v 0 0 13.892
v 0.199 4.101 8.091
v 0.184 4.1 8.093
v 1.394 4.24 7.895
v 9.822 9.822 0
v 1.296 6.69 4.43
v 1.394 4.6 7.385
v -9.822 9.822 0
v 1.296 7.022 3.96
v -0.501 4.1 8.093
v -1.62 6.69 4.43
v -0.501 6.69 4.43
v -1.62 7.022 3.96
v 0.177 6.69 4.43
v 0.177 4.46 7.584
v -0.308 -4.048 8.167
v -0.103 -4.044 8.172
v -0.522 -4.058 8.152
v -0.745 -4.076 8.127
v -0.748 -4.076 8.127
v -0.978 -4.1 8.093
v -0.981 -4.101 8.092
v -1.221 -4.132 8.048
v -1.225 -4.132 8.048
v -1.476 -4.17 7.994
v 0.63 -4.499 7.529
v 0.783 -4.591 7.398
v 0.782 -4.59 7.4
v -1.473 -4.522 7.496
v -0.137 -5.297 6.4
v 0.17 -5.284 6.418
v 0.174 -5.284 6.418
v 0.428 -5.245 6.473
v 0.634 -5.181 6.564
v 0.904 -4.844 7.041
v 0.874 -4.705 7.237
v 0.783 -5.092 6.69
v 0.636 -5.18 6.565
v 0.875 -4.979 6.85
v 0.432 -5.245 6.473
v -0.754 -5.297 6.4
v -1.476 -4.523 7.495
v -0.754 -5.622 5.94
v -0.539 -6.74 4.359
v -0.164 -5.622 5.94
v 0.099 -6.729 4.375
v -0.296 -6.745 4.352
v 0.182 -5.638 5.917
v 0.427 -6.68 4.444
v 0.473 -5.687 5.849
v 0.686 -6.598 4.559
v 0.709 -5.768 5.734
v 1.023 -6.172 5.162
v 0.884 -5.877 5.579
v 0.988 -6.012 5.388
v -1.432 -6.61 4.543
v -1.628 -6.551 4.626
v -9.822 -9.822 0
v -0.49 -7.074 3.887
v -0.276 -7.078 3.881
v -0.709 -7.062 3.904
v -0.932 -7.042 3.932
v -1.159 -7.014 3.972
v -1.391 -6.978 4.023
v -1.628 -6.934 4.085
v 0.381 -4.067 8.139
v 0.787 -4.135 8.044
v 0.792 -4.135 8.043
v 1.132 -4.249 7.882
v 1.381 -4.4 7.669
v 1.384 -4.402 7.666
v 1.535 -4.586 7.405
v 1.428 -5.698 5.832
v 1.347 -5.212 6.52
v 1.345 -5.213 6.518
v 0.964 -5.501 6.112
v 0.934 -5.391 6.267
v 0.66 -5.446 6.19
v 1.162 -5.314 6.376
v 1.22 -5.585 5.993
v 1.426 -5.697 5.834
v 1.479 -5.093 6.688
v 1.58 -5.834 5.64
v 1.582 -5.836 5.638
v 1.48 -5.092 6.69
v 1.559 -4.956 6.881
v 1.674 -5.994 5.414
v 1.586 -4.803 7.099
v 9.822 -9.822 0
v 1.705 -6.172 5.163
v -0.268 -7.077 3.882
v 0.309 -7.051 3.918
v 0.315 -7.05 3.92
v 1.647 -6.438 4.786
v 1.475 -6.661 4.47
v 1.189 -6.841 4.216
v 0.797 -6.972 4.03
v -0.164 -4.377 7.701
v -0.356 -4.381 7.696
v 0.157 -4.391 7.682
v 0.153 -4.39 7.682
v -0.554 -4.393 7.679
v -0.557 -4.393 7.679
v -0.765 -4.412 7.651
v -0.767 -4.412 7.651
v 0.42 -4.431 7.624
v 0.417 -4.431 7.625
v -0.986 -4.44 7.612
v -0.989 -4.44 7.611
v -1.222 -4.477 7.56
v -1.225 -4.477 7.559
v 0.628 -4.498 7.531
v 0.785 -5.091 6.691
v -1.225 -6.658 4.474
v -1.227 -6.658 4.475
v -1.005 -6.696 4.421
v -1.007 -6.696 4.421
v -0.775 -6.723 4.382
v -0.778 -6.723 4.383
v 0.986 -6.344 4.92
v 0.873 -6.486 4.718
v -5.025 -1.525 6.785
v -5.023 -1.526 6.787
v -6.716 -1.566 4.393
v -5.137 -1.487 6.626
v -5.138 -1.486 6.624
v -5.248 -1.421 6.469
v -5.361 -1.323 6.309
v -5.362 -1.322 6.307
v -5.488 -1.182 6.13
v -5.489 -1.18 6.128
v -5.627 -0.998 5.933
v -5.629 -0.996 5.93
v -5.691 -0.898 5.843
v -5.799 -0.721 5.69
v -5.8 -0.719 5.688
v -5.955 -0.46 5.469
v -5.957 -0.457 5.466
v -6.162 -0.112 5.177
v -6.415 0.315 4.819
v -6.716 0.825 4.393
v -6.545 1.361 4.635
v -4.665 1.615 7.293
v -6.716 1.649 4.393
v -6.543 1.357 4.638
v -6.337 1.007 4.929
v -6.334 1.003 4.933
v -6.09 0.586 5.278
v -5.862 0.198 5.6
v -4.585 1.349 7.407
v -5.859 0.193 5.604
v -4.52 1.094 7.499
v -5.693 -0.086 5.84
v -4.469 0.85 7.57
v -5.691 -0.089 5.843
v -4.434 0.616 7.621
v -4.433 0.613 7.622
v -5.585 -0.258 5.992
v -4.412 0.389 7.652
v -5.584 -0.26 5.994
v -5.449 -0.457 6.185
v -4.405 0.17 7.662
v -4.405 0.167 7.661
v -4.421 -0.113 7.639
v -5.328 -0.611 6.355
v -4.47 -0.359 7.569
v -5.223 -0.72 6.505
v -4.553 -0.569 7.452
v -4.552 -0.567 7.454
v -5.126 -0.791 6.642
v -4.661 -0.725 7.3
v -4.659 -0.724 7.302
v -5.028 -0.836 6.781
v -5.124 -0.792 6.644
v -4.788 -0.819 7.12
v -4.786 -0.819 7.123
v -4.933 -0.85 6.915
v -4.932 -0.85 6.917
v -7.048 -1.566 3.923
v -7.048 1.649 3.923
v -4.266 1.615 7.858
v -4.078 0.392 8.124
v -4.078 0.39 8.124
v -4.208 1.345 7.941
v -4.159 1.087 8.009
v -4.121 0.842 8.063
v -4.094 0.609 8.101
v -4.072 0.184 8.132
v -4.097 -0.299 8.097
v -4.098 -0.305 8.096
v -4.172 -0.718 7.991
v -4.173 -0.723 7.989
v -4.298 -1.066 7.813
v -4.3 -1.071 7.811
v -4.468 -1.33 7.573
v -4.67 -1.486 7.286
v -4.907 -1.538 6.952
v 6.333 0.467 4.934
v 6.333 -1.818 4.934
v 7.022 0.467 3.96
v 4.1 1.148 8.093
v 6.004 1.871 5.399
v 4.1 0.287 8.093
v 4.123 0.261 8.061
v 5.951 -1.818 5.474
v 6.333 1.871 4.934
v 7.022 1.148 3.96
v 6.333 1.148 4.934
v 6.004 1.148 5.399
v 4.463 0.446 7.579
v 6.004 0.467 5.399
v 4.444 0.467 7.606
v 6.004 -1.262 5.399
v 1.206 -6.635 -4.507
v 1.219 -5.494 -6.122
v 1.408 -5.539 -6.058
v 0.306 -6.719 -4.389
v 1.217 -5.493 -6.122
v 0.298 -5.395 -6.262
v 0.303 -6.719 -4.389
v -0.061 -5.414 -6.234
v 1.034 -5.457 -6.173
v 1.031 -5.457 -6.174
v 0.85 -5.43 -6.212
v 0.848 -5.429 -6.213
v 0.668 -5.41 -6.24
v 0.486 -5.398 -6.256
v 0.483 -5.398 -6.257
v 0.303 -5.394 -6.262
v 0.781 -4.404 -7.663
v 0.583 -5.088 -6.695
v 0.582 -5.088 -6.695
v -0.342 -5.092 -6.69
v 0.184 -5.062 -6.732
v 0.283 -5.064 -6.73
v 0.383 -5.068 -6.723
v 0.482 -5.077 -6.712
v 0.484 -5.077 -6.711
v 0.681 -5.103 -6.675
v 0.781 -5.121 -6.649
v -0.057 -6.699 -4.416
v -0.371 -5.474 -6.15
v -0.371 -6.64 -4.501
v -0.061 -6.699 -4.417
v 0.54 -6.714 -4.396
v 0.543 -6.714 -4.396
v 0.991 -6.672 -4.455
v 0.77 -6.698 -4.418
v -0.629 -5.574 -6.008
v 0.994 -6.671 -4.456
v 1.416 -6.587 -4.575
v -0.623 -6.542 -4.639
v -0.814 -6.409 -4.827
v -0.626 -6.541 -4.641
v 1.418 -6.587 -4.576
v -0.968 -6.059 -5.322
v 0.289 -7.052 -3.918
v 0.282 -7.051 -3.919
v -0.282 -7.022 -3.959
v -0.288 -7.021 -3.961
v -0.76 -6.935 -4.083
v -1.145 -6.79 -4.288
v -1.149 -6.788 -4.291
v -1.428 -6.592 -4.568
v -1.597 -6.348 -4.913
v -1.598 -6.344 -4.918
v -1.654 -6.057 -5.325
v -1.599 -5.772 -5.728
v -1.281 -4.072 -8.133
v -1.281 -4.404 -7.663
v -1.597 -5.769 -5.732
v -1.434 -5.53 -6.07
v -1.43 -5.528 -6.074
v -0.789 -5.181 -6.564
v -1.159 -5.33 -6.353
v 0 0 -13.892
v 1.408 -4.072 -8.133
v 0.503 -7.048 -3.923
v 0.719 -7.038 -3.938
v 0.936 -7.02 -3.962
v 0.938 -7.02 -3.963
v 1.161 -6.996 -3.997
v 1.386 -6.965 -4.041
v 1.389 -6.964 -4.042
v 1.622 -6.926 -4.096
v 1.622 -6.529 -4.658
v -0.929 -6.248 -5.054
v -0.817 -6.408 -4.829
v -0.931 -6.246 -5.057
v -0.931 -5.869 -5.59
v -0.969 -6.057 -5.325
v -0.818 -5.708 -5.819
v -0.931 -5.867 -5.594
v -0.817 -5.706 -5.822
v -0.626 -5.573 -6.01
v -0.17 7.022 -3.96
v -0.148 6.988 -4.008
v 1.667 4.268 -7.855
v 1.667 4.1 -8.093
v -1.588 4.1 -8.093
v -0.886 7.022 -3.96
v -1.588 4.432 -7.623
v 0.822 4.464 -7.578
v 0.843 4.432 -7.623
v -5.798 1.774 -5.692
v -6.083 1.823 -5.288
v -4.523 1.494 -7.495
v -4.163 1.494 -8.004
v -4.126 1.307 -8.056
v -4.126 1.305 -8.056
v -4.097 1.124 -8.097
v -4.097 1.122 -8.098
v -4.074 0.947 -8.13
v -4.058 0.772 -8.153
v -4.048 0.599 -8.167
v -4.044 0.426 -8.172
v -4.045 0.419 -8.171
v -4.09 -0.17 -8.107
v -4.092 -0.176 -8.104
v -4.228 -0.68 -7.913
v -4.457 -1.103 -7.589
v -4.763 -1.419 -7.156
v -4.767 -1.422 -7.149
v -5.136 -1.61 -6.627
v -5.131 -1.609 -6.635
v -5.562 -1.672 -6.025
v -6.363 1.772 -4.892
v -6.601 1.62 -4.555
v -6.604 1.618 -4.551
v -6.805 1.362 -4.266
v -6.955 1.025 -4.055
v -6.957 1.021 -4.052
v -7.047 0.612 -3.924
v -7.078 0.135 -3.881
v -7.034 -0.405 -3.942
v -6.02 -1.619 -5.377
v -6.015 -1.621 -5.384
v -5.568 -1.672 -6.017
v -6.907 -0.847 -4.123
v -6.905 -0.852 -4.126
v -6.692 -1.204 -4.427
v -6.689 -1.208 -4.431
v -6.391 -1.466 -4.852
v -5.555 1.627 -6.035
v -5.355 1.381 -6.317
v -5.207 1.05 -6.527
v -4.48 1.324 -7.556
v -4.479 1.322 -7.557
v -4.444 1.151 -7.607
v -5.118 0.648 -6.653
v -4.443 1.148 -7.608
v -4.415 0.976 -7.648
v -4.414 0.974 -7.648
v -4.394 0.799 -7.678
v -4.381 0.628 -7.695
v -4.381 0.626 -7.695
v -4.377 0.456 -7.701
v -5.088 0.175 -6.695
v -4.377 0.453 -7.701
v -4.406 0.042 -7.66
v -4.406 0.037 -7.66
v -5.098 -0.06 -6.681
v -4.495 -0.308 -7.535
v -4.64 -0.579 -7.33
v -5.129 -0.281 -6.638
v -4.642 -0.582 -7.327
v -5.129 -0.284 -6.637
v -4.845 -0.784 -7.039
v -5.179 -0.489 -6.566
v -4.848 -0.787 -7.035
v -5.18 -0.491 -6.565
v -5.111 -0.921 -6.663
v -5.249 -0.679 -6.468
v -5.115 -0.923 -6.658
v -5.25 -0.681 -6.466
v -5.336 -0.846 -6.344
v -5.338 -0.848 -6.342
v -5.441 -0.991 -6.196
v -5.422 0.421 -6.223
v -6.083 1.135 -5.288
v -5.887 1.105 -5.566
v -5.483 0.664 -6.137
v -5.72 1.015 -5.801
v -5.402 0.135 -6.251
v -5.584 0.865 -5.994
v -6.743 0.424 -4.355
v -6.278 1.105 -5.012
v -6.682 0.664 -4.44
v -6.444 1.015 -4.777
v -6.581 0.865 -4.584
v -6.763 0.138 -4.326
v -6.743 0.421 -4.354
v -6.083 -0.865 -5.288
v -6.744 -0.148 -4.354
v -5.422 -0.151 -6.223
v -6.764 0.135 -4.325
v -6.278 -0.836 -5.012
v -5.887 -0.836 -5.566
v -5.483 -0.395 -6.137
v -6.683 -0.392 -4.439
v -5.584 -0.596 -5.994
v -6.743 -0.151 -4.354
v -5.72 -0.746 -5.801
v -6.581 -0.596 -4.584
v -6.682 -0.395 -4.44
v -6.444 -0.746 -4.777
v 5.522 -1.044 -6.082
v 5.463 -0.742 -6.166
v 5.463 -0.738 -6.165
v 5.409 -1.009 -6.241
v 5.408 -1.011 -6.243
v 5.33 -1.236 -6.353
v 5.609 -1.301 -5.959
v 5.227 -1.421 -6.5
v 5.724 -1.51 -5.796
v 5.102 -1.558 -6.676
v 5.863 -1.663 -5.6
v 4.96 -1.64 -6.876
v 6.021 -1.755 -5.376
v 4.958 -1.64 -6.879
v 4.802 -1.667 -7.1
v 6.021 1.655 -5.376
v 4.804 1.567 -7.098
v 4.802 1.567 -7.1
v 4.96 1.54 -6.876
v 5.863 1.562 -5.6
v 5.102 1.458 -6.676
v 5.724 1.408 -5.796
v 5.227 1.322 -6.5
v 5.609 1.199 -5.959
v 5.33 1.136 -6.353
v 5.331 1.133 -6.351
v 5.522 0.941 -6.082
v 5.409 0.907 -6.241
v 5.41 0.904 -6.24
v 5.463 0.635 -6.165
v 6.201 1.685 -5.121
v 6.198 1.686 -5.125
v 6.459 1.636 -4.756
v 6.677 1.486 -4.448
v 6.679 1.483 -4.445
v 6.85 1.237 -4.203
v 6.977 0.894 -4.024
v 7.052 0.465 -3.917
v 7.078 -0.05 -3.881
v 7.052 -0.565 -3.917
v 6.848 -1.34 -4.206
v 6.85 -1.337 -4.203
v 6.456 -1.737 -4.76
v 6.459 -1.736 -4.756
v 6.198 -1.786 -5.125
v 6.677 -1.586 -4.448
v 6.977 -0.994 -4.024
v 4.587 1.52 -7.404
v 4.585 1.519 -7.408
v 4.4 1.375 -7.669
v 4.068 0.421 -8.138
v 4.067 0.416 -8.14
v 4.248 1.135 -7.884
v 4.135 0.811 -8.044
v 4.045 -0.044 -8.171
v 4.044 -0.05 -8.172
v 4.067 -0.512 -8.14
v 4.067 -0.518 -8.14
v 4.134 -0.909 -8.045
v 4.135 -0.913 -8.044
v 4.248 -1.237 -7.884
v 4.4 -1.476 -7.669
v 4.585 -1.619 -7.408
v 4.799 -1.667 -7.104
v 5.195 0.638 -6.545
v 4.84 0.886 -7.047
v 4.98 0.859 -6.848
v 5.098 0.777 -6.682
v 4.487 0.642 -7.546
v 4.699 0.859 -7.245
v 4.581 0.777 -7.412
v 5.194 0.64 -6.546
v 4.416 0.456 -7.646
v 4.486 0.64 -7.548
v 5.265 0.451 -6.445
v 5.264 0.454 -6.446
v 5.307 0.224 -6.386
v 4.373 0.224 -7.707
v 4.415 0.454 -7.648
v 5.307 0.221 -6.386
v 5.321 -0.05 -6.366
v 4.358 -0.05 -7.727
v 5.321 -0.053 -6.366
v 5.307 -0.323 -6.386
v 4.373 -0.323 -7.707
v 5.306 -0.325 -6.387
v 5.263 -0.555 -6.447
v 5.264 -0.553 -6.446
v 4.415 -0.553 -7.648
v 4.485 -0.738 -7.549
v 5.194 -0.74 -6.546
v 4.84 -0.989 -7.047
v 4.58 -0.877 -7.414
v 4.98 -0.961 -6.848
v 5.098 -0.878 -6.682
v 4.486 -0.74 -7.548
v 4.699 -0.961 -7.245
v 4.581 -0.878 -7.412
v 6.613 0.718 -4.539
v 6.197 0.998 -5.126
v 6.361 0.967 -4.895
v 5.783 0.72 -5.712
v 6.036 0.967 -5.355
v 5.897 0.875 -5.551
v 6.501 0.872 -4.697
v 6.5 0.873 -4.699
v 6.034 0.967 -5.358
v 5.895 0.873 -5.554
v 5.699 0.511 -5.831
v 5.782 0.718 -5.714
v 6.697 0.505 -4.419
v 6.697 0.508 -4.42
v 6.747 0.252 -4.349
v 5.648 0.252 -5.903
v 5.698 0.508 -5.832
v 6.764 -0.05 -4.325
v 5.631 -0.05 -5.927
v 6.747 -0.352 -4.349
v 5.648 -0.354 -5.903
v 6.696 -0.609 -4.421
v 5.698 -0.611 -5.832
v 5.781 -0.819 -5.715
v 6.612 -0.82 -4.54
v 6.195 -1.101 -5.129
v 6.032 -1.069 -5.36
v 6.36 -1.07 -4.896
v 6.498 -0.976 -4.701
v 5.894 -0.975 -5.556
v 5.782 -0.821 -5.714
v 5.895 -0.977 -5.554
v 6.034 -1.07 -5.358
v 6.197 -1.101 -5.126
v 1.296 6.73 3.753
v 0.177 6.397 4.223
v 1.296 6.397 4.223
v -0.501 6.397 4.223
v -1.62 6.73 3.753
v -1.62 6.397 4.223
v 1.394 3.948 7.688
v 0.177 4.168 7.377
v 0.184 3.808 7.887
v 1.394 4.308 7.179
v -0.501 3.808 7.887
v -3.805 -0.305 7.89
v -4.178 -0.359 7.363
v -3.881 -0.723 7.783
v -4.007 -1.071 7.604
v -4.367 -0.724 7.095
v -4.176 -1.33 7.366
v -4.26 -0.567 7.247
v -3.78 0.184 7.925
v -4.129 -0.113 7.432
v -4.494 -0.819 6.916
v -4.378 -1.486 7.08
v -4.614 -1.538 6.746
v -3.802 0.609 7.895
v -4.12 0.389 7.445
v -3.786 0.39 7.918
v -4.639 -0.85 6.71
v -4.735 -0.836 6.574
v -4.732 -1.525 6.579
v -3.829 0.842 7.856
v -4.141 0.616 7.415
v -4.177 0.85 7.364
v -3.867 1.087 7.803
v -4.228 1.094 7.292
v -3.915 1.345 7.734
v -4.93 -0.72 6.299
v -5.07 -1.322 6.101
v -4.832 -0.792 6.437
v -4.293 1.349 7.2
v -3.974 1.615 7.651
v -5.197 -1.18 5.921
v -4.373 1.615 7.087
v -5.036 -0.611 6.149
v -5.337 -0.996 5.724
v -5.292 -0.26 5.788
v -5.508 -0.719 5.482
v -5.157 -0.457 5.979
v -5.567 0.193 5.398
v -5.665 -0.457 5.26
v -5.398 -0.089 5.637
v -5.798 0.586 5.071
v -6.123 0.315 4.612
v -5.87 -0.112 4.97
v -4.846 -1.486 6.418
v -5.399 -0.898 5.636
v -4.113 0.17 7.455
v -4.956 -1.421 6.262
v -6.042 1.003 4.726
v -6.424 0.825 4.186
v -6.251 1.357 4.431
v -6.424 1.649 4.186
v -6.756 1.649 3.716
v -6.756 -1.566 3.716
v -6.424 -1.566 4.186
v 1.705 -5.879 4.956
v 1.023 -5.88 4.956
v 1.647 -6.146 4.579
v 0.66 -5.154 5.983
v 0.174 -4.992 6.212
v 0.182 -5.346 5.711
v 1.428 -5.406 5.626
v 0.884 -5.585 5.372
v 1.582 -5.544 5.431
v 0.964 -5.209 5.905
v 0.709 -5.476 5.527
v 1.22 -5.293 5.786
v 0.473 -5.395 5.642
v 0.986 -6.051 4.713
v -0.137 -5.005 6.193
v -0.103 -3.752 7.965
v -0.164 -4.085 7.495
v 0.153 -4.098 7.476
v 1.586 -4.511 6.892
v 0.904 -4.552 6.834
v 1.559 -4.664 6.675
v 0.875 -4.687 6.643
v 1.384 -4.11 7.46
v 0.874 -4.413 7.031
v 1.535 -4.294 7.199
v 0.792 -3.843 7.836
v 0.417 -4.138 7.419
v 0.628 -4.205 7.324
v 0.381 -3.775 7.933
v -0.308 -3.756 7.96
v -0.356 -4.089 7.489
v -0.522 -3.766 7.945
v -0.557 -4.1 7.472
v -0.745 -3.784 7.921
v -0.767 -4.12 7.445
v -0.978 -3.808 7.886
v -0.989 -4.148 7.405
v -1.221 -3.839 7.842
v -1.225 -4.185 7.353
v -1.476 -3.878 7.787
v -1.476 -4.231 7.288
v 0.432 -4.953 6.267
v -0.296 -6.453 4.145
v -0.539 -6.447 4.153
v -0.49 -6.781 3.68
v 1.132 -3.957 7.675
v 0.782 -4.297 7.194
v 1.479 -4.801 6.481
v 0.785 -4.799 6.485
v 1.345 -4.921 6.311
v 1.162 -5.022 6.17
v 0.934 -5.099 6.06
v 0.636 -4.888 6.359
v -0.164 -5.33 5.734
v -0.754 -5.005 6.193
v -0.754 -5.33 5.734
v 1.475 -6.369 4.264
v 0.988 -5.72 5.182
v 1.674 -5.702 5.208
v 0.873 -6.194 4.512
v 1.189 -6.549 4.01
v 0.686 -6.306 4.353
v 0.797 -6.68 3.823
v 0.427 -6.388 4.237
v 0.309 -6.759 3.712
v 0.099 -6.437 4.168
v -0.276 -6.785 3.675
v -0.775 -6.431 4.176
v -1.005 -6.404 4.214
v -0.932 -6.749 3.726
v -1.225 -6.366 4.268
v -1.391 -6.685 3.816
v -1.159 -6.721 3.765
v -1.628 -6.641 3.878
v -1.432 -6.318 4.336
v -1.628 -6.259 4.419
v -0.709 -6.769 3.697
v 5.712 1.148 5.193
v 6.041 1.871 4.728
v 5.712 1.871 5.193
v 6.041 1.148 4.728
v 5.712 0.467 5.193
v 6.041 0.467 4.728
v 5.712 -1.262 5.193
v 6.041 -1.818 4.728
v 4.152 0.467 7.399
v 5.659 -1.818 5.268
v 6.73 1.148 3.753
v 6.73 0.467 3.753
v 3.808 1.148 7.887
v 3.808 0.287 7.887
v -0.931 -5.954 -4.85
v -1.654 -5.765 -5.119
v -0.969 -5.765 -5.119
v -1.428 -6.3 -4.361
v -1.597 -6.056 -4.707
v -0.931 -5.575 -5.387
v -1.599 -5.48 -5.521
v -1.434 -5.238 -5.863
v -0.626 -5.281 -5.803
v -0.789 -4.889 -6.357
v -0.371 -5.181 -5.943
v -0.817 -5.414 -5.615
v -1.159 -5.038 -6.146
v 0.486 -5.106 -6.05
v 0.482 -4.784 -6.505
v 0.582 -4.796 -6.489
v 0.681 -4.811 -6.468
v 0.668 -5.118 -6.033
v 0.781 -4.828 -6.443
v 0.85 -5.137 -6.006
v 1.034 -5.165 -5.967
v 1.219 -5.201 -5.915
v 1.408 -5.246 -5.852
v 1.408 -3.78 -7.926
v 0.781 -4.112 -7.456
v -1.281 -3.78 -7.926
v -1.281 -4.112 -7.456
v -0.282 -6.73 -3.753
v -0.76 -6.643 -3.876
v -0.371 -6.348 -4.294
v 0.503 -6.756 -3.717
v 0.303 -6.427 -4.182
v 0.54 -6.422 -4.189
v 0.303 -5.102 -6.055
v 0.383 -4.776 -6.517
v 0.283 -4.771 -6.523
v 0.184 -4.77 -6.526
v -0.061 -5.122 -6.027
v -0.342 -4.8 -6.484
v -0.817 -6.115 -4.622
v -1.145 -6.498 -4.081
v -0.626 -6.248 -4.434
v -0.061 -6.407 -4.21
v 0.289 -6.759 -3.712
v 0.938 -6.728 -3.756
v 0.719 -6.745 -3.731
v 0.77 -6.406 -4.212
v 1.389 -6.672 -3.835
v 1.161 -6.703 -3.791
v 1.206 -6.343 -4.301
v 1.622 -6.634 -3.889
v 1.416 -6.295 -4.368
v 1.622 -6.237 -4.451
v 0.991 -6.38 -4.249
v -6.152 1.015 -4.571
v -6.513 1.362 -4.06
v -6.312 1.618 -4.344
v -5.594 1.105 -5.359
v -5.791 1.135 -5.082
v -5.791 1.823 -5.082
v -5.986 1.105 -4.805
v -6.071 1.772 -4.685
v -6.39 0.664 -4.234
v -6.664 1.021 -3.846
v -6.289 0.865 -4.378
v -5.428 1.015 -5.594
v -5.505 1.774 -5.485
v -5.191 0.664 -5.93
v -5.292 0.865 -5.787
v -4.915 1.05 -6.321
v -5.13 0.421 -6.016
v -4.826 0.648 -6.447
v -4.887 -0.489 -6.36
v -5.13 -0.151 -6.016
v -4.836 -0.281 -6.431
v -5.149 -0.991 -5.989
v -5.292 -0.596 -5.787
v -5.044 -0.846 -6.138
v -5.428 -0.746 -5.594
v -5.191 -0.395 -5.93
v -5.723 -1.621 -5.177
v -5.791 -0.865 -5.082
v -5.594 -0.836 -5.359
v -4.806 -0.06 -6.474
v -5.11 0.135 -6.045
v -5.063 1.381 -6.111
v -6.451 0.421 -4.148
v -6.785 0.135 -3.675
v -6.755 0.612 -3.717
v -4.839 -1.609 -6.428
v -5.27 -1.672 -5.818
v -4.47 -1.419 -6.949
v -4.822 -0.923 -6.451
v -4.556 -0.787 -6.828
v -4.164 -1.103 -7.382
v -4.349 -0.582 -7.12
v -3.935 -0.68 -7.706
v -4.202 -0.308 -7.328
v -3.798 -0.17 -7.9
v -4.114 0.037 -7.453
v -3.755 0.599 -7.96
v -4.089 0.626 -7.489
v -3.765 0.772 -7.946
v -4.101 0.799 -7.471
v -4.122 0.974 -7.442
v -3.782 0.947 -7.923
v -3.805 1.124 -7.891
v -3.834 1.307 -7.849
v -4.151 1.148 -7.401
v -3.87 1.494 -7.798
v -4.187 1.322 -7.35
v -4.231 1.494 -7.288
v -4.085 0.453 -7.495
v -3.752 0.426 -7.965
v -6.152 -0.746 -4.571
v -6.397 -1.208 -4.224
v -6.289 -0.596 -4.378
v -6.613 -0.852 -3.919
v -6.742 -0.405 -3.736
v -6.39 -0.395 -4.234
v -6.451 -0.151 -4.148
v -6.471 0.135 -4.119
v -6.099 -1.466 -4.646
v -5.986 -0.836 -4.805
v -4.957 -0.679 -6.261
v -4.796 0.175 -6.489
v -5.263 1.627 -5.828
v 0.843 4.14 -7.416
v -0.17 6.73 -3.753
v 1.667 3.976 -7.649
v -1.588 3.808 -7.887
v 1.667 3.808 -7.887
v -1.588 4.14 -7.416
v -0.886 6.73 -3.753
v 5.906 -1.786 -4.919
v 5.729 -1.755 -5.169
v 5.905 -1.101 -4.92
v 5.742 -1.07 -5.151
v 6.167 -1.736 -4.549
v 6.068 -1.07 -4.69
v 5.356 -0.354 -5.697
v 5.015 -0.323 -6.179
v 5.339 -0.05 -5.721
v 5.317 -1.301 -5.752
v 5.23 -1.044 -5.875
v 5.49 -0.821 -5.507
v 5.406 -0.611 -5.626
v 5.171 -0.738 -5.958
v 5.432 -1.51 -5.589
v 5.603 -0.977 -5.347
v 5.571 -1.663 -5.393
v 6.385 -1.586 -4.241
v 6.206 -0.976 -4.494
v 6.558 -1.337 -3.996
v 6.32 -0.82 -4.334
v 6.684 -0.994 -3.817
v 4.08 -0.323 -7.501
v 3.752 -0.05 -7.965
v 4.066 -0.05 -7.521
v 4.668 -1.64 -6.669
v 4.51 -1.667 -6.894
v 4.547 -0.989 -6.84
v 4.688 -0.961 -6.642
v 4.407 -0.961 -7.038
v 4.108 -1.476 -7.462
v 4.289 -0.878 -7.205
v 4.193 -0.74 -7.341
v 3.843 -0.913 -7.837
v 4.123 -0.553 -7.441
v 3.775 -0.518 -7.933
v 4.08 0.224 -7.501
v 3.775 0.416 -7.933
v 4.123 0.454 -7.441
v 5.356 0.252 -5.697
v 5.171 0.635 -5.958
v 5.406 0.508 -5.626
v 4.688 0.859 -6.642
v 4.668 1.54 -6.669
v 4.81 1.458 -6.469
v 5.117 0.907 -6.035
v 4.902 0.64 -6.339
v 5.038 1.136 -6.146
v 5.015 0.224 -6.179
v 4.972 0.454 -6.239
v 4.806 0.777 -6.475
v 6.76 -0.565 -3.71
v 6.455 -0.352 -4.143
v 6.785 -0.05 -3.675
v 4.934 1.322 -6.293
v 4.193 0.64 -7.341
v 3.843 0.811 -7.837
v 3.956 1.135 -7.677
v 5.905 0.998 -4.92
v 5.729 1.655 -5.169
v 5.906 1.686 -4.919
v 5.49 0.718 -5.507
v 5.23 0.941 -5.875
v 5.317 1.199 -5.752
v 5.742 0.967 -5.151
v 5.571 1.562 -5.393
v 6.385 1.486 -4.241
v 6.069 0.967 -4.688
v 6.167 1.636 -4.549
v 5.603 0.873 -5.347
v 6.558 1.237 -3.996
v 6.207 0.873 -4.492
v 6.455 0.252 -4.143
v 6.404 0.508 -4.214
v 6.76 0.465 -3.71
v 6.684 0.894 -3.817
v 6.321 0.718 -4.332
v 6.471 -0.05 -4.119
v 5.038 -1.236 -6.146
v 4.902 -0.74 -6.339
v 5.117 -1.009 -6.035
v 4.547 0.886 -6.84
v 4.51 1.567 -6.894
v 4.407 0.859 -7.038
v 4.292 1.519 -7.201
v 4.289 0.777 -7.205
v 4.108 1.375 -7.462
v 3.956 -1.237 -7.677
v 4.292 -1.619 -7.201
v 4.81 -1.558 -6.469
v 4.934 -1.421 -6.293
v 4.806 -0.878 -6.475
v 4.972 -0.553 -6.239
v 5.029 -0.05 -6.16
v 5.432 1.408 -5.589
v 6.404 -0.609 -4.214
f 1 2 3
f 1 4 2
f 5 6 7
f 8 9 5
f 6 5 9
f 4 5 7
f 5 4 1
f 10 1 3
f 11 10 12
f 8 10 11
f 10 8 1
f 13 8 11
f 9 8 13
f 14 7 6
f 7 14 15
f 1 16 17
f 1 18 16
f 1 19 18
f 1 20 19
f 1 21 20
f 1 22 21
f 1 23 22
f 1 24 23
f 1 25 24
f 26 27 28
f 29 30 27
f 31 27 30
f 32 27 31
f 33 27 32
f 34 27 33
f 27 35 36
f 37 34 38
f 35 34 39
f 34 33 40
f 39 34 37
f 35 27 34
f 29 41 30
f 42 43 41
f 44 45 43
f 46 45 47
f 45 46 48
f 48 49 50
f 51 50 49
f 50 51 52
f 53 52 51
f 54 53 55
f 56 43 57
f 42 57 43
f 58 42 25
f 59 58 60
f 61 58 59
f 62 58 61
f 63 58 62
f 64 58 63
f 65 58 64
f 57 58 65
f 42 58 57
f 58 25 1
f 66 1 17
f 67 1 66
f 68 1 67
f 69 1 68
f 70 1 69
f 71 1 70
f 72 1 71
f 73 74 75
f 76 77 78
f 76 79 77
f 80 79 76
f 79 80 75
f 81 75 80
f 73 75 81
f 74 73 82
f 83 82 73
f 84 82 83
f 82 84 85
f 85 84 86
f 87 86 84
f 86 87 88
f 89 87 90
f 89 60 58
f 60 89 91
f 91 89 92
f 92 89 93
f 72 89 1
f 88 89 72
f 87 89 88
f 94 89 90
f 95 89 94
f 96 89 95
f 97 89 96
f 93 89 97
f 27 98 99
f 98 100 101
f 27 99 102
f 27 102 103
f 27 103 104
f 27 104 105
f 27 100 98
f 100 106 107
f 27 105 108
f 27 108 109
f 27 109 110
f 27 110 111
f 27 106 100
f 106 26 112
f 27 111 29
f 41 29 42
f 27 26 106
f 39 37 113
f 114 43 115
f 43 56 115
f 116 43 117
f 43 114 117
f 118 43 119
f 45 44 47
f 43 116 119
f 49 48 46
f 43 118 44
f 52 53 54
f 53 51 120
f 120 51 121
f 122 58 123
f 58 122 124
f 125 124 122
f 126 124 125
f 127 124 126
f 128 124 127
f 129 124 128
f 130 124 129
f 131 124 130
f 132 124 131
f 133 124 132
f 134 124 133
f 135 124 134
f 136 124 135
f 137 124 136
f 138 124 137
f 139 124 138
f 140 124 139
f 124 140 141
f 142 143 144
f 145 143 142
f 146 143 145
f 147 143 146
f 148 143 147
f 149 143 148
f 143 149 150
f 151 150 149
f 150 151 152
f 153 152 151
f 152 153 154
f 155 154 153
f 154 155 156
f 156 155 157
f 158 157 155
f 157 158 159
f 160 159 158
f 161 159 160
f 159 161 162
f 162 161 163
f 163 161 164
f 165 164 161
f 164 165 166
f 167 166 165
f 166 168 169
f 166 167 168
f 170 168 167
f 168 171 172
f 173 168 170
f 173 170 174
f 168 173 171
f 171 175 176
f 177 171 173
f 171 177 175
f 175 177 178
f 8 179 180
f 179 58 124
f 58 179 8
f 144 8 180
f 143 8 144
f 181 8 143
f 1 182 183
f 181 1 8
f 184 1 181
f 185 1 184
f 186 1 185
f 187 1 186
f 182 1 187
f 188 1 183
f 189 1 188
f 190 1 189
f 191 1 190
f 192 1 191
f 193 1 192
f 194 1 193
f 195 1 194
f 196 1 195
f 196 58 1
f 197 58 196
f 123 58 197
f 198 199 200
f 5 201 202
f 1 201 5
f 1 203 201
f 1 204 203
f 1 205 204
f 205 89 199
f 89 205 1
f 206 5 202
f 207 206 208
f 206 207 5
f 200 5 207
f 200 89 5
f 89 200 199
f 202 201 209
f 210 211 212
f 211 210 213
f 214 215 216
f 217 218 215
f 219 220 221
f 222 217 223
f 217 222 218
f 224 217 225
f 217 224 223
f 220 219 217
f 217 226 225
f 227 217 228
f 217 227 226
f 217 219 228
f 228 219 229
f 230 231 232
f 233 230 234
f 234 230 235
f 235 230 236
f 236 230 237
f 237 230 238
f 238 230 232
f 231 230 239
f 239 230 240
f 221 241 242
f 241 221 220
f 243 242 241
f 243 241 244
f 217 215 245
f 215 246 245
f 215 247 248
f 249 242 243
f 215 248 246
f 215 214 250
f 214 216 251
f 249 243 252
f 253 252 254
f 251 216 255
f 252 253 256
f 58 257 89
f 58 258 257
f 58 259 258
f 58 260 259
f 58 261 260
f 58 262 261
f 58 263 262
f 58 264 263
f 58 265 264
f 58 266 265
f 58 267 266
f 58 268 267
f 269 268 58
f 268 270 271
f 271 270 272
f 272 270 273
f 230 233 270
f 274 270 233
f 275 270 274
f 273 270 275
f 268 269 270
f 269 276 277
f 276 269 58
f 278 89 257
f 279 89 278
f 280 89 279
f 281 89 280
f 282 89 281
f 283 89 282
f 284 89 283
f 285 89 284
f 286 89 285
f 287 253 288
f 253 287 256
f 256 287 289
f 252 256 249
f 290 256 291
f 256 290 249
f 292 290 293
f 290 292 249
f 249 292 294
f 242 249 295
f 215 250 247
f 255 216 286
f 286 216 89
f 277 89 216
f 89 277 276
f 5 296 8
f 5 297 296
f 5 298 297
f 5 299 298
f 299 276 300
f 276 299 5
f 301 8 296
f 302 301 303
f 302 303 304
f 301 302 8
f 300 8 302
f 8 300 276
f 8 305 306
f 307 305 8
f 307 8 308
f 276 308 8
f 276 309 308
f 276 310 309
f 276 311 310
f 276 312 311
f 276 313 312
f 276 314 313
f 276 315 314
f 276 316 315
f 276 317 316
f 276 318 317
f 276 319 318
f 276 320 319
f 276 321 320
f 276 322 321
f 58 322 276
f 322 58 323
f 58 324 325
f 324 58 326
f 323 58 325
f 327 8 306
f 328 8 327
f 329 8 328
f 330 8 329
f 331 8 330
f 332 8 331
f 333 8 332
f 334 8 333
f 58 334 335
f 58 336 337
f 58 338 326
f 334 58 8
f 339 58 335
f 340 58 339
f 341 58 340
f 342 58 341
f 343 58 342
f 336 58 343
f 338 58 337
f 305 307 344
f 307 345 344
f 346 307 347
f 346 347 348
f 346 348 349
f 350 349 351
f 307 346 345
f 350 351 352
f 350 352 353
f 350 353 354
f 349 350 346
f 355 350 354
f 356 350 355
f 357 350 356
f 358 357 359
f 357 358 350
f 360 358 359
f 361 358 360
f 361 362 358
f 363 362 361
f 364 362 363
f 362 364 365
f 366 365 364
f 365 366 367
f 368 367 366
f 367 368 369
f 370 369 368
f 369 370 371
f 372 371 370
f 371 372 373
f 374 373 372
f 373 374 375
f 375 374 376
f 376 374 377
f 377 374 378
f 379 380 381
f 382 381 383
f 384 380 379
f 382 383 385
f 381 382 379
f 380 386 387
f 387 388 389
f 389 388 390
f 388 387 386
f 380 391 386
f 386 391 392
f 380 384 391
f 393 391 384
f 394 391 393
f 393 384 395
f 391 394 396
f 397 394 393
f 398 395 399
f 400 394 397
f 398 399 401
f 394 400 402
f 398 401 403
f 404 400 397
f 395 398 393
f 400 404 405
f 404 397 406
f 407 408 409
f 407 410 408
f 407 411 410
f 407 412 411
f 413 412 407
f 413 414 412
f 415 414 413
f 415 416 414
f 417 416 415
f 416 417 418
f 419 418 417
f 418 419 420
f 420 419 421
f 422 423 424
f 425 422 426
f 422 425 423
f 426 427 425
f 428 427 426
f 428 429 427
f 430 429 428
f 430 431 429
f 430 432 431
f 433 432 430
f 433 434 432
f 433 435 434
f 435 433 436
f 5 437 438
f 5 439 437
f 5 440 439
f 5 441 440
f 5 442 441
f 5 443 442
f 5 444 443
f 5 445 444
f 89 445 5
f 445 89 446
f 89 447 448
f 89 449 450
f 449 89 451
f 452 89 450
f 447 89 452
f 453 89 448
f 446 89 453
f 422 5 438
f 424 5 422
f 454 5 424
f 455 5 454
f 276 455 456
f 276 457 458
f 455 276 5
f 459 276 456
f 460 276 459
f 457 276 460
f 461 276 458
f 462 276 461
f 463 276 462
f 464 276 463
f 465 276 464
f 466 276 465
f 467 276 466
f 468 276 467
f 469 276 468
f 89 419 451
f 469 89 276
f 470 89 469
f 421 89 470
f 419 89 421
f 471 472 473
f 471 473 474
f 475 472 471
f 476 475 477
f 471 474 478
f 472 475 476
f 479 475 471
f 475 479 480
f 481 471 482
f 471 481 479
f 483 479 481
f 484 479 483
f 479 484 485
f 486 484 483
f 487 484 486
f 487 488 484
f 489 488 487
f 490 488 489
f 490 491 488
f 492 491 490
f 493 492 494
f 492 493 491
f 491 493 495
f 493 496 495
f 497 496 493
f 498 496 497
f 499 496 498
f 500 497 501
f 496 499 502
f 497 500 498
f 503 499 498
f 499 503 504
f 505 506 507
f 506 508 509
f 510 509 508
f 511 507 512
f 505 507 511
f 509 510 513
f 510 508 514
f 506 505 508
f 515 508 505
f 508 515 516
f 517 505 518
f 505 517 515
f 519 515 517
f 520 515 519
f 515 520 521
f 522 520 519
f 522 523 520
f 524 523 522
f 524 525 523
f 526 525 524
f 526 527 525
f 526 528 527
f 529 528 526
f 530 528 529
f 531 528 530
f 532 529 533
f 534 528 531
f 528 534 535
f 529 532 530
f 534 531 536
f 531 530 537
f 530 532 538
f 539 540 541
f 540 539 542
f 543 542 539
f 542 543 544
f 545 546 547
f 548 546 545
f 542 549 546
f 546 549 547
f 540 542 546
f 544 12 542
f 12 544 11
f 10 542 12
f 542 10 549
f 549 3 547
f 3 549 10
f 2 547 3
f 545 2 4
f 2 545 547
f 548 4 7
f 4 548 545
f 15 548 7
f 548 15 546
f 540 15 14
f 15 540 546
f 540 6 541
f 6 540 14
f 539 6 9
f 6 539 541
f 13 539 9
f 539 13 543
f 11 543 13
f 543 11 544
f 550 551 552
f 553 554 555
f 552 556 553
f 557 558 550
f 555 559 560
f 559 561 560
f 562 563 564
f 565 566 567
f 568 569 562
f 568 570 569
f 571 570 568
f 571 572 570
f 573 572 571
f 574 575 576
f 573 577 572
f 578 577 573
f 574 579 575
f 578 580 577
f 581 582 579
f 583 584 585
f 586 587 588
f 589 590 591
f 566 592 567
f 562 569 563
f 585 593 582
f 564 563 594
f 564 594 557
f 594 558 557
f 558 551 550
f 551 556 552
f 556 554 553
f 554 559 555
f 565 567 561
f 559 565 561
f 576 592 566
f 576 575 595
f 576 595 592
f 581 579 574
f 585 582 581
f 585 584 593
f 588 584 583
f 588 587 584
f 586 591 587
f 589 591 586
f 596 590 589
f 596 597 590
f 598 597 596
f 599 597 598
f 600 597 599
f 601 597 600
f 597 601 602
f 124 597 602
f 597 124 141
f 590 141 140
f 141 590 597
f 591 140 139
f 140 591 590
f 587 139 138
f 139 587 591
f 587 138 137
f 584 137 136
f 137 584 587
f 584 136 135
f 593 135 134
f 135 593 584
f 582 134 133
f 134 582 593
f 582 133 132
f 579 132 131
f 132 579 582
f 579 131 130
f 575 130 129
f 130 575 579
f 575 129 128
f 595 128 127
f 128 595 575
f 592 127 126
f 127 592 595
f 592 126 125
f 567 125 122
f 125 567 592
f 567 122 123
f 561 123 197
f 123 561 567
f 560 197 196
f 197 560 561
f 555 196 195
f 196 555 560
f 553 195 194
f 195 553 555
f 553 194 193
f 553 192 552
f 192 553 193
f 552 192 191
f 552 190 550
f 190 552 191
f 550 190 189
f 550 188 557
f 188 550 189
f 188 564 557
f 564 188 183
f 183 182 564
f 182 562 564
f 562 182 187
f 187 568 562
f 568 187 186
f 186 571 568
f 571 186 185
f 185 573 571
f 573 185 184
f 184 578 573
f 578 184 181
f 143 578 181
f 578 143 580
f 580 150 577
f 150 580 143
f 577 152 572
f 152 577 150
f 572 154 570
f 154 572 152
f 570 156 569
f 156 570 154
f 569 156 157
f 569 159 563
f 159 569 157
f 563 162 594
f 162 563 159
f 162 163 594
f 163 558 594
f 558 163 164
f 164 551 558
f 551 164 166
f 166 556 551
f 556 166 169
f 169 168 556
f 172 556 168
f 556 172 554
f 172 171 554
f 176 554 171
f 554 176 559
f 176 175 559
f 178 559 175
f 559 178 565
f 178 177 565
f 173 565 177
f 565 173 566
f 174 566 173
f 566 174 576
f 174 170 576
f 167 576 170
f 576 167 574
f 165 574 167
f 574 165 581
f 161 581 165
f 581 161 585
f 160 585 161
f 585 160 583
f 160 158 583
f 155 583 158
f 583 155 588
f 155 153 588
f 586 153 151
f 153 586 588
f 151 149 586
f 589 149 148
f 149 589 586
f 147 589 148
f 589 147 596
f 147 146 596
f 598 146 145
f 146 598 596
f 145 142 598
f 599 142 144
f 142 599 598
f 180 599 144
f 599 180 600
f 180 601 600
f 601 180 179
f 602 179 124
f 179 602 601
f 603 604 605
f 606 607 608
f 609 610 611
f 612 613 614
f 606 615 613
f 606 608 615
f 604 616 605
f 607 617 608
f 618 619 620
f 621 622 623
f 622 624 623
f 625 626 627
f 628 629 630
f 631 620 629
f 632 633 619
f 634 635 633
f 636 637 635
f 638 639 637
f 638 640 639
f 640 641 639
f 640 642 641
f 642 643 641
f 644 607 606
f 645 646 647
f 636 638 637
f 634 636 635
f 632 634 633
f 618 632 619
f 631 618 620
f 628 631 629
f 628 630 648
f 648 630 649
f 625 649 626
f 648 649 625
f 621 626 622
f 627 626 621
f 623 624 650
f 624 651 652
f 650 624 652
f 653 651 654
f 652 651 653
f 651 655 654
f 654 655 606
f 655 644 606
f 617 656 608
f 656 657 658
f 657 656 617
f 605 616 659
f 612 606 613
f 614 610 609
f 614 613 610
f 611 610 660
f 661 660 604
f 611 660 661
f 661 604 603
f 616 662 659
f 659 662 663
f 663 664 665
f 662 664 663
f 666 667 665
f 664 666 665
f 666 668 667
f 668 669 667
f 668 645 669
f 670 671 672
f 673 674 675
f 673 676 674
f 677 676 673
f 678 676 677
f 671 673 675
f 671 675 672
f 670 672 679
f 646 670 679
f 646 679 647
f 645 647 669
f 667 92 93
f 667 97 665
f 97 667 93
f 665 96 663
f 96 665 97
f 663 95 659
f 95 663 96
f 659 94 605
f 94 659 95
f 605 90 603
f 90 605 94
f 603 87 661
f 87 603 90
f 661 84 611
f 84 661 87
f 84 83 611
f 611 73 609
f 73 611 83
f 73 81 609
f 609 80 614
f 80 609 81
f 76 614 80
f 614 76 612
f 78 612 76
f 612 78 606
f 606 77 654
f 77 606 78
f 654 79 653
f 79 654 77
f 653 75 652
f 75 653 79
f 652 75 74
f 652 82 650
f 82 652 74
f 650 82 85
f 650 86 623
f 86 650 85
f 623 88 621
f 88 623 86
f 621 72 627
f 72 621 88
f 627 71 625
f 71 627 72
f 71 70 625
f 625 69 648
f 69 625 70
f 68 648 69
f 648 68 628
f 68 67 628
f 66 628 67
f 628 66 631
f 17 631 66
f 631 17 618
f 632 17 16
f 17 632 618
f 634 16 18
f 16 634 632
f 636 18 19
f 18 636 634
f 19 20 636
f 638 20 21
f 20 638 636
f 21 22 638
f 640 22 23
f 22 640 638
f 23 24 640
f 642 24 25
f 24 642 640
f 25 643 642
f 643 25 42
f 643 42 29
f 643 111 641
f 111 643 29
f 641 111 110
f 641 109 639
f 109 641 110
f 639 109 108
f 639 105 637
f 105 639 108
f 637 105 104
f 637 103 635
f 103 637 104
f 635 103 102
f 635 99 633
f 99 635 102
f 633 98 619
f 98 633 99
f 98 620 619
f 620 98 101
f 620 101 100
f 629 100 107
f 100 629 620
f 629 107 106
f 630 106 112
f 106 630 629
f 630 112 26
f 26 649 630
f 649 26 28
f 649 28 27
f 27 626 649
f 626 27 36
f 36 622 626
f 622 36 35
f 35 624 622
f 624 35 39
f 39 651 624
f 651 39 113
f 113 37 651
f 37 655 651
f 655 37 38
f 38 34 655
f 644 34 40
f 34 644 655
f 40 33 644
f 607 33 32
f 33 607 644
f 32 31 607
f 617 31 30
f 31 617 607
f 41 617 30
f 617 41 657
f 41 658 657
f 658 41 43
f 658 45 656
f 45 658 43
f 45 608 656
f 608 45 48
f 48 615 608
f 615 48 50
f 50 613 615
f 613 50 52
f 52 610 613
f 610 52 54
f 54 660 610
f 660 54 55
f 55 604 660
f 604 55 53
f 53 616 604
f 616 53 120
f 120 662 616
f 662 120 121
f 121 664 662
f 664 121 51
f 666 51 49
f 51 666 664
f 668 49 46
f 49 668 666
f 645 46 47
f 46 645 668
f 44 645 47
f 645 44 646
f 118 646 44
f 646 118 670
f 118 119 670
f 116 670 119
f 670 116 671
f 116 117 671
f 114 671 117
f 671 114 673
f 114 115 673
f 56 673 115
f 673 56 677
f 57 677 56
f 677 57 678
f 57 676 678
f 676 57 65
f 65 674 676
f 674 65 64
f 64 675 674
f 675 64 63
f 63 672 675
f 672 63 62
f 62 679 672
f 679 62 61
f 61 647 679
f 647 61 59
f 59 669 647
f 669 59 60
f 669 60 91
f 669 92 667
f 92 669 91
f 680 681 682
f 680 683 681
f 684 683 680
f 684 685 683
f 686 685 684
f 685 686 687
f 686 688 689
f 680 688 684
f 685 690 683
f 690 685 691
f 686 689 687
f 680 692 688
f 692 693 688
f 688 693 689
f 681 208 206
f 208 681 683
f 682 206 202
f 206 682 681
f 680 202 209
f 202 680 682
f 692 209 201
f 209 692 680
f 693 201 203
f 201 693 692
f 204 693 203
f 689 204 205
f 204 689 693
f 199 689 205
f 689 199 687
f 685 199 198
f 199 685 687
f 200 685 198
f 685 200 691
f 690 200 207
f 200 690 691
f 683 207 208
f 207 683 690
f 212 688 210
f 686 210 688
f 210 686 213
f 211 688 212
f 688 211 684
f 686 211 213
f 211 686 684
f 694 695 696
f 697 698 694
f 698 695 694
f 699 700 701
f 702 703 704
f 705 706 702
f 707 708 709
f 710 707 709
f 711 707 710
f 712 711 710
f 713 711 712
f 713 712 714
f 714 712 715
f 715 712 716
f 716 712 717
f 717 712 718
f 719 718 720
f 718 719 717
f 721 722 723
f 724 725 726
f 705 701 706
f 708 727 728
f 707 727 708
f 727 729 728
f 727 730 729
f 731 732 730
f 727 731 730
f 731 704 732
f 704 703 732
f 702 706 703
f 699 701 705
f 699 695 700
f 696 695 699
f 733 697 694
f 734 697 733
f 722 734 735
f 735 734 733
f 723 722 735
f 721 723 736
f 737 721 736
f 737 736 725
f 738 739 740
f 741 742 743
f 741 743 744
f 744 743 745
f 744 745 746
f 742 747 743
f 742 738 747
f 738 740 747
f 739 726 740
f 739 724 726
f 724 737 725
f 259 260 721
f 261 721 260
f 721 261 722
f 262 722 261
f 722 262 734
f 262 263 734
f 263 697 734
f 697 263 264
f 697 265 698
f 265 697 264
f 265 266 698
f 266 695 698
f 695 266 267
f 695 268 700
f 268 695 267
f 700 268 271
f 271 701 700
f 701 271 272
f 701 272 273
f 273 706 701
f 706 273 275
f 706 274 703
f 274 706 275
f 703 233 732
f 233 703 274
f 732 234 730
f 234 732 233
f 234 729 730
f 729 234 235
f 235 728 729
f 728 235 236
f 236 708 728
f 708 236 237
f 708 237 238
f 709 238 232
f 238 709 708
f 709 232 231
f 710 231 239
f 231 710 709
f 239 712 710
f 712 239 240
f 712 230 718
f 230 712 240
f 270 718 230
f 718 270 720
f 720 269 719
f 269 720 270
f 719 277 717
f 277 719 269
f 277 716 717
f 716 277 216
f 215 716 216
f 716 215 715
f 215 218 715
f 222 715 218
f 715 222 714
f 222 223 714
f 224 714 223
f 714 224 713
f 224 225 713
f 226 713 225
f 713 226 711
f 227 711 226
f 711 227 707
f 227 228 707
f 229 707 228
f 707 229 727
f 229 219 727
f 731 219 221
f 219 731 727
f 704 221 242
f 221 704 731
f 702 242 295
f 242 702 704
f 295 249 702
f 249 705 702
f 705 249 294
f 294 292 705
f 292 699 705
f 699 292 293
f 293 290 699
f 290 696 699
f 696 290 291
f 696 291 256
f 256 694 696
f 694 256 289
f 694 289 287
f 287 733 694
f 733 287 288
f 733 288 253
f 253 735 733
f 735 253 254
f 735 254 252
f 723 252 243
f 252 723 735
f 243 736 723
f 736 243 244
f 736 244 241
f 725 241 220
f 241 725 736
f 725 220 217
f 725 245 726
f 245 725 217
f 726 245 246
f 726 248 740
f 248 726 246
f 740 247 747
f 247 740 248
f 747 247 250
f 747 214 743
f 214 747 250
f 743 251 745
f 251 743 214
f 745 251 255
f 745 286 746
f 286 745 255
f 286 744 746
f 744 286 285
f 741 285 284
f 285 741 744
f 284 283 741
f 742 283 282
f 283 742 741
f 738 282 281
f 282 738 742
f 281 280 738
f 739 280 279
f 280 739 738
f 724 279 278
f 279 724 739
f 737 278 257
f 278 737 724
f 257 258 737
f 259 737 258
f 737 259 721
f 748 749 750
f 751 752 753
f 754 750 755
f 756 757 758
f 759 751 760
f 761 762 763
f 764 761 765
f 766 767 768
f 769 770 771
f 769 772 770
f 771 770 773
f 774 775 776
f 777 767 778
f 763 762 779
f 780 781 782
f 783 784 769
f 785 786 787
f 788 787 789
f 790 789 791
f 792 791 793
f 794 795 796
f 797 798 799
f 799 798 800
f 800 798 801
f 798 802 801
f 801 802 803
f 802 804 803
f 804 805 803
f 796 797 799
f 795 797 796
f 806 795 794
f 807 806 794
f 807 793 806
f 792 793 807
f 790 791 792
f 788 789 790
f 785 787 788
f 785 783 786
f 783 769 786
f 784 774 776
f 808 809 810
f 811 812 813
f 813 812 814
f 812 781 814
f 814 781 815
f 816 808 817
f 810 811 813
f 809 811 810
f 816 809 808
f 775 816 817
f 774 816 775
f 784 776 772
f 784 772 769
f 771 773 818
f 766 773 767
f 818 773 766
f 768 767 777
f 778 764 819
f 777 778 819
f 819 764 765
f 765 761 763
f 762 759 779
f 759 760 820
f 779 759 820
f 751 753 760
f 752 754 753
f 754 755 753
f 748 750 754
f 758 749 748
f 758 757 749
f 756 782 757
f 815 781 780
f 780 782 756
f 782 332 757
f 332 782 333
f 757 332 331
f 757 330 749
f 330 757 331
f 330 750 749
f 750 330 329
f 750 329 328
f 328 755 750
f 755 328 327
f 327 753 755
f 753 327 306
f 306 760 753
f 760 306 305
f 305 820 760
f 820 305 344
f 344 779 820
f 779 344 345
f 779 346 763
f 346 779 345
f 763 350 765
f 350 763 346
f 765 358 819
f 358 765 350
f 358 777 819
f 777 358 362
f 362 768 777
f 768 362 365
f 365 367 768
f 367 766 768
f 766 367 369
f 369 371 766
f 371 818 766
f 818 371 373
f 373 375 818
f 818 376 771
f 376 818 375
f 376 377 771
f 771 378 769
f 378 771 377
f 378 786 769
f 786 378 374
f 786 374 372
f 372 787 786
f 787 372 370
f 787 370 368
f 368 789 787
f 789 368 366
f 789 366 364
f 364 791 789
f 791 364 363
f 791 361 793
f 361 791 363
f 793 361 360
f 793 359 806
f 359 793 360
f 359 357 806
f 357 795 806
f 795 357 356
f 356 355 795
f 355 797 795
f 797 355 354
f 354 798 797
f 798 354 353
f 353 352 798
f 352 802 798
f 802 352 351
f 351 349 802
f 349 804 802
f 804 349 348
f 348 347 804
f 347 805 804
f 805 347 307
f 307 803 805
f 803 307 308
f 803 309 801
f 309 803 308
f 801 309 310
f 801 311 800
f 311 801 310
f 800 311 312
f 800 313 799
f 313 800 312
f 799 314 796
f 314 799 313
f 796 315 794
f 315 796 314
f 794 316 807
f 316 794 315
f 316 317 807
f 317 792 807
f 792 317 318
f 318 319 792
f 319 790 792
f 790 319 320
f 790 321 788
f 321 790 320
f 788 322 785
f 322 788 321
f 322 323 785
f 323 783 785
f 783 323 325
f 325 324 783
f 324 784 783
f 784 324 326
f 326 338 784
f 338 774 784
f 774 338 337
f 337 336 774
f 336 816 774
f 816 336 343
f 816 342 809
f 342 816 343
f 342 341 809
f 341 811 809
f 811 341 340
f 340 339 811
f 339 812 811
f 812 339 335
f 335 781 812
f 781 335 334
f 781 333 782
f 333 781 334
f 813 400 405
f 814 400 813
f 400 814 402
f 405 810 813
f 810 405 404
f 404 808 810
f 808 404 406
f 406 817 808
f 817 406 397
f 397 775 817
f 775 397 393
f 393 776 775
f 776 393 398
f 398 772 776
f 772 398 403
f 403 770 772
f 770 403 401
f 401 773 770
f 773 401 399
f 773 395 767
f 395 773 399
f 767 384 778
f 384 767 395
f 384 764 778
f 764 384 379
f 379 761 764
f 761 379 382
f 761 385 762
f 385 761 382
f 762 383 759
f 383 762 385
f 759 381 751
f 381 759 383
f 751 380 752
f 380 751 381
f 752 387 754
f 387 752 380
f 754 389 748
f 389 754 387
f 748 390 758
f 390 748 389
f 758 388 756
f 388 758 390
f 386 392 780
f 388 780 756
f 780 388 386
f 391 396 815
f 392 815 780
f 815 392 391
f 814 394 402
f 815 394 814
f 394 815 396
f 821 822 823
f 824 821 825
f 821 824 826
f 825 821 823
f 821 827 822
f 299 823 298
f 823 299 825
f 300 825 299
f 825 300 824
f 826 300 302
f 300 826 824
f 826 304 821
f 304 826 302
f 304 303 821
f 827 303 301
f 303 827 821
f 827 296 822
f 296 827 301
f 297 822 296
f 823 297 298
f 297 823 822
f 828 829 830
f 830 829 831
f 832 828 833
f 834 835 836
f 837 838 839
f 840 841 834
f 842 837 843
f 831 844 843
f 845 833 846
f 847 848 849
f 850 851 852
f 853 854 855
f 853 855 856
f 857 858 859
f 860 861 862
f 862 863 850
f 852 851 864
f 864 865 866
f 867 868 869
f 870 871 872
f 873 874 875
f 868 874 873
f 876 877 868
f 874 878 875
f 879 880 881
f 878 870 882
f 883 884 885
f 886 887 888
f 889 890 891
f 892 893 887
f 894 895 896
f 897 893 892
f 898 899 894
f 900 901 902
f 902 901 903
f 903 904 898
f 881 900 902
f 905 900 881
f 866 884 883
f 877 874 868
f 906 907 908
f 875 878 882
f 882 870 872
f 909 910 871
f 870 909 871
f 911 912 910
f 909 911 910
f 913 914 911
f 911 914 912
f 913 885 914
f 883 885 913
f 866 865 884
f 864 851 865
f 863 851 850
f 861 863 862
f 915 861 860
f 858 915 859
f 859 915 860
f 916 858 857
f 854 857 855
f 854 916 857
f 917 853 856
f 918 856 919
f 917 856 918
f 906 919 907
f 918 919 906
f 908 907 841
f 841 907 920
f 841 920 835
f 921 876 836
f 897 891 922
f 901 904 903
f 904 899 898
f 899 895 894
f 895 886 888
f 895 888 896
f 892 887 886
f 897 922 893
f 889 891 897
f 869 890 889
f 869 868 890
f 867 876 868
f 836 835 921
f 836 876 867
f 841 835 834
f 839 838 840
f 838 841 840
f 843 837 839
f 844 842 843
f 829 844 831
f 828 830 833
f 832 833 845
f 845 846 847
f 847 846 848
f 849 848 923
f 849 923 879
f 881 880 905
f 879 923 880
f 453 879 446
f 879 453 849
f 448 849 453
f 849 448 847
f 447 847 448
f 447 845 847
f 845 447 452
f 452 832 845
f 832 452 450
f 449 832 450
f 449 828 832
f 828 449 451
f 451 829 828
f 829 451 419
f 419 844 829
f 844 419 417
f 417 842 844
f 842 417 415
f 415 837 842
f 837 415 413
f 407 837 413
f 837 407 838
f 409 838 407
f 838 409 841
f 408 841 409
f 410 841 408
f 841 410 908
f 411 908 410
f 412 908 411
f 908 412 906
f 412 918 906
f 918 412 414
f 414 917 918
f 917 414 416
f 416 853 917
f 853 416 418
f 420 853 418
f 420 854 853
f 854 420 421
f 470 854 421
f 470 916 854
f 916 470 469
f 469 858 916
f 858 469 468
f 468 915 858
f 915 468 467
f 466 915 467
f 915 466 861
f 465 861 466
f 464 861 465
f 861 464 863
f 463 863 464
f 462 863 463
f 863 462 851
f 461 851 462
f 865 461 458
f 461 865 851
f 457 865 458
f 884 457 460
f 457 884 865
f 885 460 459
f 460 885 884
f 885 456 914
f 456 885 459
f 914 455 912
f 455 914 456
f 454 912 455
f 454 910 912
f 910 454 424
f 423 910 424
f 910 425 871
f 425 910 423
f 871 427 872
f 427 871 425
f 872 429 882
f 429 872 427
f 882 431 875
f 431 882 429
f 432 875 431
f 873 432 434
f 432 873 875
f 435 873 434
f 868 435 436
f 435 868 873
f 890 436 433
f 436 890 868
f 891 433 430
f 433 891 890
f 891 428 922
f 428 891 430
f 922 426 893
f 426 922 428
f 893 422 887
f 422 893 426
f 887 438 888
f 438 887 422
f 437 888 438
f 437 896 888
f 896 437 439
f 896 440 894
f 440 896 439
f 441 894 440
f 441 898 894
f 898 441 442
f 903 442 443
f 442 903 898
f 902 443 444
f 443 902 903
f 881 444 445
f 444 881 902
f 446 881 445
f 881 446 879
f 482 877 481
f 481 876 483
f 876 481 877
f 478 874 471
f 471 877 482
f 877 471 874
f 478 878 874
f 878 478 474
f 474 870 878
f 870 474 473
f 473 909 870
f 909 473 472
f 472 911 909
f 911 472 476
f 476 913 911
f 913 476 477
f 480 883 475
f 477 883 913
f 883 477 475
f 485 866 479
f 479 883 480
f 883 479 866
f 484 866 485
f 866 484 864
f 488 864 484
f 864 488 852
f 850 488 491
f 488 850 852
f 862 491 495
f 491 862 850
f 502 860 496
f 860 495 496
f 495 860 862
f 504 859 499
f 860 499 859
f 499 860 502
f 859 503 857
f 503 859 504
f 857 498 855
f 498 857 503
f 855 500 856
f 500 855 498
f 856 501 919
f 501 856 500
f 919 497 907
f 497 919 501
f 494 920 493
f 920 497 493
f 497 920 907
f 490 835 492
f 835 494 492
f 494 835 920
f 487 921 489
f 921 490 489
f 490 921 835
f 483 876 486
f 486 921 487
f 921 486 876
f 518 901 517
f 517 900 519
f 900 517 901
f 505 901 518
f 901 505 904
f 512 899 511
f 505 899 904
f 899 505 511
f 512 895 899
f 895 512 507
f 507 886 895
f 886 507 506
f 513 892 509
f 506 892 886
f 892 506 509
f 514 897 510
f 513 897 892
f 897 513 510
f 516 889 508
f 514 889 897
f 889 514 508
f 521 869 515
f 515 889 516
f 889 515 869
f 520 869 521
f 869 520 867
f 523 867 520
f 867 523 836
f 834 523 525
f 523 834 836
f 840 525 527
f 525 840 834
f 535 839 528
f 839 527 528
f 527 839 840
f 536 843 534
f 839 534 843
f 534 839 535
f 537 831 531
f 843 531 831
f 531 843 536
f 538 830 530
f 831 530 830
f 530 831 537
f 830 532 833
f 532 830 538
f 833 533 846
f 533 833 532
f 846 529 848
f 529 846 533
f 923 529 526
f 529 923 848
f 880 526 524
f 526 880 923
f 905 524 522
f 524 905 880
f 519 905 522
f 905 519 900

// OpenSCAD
cube_size = 20;
cube_height = cube_size*sqrt(2);
magical_angle = 54.74;

module preset_cube(){
    
        cube([cube_size, cube_size, cube_height], center = true);
}

module triangle_cut(){
    translate([0, cube_size*6/7, cube_height/2])
    rotate([-magical_angle, 0, 0])
    preset_cube();
                
    translate([0, -cube_size*6/7, cube_height/2])
    rotate([magical_angle, 0, 0])
    preset_cube();
}

module letter(l){
    translate([0, cube_size*6/7, cube_height/2])
    rotate([-magical_angle, 180, 180])
    mirror([180, 0, 0])
    linear_extrude(29, center=true) text(l, 5, "3270 Nerdfont", halign = "center", valign = "center");
}

difference(){

    union(){
          color("#444444")
            preset_cube();
        };


    
        union(){
            color("black")
            triangle_cut();
            
            rotate([0,0,90])
            color("white")
            triangle_cut();
        };
        
        rotate([180,0,0])
        union(){
            color("black")
            triangle_cut();
            
            rotate([0,0,90])
            color("white")
            triangle_cut();
        };
        
        string = "1234";
        
        union(){
            for ( i = [0:1:4]) 
                rotate([0,0,90*i])
                letter(string[i]);
        };
        
        
        string2 = "5678";
        rotate([180,0,0])
        union(){
            for ( i = [0:1:4]) 
                rotate([0,0,90*i])
                letter(string2[i]);
        }
}
